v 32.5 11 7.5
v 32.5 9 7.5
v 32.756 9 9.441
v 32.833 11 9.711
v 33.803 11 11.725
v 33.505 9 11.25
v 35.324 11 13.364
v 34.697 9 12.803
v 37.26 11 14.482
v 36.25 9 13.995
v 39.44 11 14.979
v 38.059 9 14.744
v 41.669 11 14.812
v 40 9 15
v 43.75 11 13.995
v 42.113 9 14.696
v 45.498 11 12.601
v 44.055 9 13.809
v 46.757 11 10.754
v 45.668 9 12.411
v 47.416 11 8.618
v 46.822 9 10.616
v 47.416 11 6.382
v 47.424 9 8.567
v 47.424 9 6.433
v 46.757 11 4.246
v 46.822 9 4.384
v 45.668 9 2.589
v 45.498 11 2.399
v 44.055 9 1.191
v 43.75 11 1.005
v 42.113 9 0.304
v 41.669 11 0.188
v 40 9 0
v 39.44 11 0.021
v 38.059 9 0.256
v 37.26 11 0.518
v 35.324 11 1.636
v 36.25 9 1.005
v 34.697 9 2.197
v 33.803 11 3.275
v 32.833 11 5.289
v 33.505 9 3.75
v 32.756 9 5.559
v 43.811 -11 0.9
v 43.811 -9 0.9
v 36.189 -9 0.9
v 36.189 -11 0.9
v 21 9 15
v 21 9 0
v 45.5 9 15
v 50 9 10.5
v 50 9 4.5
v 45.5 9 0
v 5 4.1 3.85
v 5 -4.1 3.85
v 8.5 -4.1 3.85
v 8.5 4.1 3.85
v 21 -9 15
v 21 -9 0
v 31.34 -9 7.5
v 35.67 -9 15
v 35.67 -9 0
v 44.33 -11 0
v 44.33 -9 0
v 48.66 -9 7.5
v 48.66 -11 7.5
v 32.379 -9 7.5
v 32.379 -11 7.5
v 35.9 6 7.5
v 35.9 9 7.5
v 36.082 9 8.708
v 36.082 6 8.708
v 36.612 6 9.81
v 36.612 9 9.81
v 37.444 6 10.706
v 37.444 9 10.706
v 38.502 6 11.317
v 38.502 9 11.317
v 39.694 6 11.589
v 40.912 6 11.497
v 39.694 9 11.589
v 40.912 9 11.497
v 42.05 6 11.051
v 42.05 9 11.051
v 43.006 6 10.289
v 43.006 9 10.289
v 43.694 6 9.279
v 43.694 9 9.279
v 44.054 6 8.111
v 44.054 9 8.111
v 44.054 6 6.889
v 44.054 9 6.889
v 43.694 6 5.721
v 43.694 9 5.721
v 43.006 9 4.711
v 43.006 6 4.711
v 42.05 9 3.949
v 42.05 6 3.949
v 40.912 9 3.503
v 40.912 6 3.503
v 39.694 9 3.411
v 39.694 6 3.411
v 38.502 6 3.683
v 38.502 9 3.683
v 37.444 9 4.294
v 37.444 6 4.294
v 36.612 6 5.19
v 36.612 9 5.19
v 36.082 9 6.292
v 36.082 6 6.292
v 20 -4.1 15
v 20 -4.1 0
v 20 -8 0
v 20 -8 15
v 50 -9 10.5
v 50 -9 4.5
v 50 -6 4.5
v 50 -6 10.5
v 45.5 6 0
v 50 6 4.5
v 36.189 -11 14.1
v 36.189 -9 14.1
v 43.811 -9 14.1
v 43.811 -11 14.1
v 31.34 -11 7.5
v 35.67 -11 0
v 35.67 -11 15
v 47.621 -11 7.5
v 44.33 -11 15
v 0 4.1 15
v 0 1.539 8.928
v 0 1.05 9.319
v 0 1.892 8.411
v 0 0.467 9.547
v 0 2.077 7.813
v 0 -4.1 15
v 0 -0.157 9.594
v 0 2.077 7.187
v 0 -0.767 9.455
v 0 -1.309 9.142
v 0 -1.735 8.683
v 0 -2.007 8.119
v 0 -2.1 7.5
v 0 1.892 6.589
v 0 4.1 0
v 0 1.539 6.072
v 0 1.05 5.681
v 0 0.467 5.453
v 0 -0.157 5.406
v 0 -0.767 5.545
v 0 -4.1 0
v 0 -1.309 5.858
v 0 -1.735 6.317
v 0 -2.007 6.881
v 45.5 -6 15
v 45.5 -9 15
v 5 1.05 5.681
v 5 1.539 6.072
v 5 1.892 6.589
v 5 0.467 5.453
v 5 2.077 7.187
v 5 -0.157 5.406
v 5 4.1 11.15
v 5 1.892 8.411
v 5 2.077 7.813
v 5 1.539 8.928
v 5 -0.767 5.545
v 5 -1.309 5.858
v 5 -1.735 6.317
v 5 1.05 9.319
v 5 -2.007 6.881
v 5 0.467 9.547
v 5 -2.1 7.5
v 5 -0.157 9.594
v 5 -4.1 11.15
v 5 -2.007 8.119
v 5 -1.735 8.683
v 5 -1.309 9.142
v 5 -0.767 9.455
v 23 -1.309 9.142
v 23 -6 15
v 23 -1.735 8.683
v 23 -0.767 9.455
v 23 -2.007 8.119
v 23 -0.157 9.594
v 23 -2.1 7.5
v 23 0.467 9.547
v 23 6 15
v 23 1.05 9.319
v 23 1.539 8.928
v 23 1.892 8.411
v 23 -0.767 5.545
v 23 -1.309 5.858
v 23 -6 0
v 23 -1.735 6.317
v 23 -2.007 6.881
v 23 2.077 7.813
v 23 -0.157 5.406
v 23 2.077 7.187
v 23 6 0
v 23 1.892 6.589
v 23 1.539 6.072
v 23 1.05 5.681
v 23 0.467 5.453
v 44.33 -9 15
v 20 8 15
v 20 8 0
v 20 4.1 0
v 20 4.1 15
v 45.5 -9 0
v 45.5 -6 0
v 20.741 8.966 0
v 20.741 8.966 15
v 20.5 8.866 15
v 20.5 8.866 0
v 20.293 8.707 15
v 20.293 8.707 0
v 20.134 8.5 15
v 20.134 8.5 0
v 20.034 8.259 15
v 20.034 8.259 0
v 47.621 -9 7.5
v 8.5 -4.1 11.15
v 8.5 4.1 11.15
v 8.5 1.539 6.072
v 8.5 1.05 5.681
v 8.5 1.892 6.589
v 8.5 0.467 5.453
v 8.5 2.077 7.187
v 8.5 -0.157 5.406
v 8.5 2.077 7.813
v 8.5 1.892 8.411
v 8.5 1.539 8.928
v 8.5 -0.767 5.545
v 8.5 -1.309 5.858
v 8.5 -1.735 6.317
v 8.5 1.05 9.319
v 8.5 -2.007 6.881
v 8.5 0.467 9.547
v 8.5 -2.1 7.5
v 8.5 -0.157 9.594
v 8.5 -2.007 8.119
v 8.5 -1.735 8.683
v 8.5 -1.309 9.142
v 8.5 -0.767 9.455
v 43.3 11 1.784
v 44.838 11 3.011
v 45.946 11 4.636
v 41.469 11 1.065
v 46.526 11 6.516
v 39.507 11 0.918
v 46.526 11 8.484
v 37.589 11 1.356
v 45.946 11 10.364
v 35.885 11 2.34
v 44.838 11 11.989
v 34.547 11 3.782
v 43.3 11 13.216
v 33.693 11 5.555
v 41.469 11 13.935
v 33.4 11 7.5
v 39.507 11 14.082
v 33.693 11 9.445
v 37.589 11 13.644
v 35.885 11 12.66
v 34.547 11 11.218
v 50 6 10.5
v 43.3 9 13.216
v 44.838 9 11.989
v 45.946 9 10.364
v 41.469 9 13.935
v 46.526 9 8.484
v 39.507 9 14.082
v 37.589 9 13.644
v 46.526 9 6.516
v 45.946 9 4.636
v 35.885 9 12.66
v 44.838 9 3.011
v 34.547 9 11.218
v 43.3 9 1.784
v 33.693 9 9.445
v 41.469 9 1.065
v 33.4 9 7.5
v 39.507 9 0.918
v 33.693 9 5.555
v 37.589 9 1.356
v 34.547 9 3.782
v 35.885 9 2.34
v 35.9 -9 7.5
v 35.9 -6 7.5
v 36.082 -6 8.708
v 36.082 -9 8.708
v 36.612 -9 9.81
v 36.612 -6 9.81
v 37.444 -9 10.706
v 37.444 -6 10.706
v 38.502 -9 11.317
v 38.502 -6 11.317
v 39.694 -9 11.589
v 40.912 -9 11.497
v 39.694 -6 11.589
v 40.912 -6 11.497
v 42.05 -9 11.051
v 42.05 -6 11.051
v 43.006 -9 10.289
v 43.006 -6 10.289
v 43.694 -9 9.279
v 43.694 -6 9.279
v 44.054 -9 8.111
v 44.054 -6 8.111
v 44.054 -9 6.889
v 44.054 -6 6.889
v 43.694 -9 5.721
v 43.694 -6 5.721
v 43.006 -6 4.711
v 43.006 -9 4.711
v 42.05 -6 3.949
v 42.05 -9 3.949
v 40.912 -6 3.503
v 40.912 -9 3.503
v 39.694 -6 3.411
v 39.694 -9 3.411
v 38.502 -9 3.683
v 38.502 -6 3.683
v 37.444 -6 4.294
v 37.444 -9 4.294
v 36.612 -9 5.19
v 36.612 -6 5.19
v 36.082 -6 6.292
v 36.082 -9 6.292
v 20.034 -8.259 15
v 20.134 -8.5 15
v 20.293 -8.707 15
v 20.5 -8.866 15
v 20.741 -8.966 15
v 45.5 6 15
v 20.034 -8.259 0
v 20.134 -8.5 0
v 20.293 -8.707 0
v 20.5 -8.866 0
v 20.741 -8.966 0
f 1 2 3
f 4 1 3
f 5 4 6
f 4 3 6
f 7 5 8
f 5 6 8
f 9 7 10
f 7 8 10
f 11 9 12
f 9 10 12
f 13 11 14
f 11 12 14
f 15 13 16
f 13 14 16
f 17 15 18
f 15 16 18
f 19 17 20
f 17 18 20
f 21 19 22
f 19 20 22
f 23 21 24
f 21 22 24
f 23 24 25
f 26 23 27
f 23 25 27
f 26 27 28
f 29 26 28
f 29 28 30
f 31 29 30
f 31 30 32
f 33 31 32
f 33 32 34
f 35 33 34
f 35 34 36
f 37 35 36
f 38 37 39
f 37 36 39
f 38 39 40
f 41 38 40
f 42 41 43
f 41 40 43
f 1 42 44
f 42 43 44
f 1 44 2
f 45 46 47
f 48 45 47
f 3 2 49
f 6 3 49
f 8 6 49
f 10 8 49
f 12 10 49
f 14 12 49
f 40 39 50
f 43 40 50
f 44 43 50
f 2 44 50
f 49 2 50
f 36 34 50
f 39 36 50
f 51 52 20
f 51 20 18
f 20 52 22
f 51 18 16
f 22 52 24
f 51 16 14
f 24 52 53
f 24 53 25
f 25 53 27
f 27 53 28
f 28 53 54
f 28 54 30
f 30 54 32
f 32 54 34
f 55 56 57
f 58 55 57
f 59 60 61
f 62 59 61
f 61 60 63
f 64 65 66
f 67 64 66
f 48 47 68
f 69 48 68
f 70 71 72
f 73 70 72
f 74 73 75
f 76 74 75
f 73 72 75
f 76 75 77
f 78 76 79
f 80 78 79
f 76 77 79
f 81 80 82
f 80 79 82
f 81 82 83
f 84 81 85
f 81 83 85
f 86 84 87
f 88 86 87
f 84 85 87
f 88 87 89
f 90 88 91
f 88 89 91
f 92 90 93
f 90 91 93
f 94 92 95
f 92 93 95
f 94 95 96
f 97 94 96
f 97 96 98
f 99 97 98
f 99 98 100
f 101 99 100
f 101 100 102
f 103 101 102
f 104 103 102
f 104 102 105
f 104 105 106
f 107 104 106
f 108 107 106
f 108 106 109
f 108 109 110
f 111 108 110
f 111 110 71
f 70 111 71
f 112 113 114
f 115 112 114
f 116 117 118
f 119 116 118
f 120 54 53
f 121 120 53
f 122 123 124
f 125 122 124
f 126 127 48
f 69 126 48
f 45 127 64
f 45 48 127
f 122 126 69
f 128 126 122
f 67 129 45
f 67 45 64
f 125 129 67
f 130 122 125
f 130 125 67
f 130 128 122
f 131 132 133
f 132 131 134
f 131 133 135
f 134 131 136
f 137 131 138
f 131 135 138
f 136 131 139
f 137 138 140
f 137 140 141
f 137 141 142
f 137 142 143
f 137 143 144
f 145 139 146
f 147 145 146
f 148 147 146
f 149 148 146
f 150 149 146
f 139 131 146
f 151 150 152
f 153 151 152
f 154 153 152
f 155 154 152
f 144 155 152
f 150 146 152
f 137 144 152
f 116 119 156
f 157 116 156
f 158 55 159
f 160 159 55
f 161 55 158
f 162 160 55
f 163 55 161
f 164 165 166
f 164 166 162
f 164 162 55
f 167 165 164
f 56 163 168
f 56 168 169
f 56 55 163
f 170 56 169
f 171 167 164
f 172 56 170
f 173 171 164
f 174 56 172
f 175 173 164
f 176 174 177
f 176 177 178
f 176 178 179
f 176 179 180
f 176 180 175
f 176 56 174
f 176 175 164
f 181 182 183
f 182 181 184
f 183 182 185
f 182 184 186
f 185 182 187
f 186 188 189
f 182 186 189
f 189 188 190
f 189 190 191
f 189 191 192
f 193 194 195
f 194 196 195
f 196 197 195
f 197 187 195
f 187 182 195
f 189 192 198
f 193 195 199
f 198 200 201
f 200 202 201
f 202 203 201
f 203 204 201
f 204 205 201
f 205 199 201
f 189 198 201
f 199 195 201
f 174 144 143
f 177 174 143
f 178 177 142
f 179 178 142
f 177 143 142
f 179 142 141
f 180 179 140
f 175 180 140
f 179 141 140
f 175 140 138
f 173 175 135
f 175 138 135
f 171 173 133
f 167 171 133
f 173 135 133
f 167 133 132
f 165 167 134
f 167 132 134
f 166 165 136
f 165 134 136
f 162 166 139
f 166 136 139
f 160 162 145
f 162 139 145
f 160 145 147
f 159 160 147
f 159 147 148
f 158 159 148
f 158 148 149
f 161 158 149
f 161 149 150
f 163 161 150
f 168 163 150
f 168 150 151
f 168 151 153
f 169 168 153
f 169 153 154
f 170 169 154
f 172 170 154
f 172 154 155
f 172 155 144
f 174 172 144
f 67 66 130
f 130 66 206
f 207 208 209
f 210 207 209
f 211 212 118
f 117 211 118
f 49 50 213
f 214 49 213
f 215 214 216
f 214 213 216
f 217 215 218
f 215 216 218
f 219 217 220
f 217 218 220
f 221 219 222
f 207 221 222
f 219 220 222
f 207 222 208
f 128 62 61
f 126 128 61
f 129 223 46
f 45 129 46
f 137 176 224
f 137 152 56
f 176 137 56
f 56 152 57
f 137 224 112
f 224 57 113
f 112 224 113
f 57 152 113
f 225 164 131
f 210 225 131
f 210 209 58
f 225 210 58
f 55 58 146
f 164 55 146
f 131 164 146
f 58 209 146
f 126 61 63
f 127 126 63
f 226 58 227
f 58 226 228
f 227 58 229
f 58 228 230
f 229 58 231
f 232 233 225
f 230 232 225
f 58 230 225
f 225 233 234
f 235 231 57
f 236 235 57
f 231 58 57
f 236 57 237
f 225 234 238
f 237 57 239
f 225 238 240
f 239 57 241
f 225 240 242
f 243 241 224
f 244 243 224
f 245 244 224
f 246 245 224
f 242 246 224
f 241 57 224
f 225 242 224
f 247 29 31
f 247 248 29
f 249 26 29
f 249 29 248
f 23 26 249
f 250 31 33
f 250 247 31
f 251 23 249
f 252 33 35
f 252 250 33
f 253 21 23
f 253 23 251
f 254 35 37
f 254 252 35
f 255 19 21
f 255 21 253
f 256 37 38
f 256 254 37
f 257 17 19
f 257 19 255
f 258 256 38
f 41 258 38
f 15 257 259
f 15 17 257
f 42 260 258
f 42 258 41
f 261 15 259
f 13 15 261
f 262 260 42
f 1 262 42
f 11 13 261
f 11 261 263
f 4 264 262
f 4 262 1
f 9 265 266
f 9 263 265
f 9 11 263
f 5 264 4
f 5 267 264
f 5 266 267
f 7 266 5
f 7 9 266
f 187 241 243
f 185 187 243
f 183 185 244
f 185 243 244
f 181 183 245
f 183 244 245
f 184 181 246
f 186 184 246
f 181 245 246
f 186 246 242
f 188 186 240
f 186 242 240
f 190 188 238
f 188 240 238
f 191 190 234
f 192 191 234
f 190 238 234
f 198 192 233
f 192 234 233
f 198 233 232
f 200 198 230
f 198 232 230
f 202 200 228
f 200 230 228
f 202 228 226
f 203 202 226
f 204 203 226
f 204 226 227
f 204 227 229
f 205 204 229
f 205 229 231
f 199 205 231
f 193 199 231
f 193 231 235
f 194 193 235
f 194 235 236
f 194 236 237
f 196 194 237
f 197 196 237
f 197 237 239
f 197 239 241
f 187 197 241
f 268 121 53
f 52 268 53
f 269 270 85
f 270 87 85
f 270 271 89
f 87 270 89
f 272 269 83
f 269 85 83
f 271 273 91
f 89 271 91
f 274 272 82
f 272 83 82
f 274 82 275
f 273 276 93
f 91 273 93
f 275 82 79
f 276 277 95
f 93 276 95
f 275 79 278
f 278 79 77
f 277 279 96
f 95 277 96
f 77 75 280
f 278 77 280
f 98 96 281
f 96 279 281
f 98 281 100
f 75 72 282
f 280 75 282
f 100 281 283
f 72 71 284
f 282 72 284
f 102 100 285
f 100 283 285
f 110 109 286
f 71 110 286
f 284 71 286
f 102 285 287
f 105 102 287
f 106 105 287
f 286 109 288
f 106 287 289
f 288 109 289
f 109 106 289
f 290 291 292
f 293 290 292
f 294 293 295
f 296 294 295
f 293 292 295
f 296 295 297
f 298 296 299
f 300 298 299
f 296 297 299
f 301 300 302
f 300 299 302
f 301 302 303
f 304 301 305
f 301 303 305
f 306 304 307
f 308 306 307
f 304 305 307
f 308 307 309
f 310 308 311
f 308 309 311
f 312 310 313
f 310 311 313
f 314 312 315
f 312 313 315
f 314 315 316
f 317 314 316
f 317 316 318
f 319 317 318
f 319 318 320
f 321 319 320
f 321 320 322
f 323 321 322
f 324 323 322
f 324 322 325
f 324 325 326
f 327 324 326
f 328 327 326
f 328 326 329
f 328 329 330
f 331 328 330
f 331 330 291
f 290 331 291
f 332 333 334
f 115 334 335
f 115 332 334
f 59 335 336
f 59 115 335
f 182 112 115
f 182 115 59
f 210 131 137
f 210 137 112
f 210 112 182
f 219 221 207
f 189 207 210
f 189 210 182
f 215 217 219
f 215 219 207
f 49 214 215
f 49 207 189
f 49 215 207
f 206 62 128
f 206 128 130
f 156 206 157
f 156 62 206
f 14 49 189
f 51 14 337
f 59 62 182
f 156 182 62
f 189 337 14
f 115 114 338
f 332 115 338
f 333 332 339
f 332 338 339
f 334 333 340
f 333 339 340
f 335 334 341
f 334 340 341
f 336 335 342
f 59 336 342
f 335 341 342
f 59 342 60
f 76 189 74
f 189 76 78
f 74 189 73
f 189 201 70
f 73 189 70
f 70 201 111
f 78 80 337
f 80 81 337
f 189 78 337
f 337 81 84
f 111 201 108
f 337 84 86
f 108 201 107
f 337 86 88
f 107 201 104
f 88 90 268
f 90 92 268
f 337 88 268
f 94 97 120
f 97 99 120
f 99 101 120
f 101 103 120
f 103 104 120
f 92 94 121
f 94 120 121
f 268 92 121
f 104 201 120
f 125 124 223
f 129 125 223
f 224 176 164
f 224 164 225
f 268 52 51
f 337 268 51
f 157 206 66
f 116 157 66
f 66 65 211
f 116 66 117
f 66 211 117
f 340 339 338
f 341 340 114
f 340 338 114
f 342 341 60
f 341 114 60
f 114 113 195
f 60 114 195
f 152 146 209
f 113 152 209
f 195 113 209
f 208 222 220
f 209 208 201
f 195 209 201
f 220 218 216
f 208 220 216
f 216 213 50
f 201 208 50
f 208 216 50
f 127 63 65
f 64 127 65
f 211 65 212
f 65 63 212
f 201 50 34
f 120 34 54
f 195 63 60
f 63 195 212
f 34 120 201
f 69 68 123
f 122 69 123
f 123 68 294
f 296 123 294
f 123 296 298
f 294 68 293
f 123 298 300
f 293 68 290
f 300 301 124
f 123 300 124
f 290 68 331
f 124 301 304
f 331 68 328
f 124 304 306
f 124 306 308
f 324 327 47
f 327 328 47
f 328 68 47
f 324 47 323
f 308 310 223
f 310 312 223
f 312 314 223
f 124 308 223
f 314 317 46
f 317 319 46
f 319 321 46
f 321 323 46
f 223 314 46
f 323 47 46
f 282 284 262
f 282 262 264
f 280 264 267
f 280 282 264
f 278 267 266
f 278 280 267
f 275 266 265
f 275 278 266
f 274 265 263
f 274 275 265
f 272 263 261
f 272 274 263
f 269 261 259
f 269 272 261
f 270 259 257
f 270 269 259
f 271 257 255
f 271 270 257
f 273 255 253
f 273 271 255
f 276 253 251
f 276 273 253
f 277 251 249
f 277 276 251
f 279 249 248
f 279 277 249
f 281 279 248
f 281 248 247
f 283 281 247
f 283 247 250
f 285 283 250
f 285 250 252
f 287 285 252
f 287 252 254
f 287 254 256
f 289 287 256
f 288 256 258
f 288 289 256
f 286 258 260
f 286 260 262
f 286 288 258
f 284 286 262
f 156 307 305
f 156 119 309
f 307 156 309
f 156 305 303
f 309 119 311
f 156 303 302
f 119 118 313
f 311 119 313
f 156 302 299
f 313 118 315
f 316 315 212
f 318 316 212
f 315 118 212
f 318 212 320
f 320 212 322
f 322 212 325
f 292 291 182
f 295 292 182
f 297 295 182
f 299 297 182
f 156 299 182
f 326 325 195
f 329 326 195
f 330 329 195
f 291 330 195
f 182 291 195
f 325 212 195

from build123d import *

# Parameters (mm, degrees)
F1_DEPTH  = 15
F2_R      = 2.1
F3_DEPTH  = 50.001
F4_W      = 3.5
F4_H      = 7.3
F5_DEPTH  = 13.101
F6_R      = 4.1
F7_DEPTH  = 18.001
F9_DEPTH  = 2
F10_R     = 7.5
F10_R_2   = 6.6
F11_DEPTH = 2


with BuildPart() as f1:
    # F0 (on Top) → F1 (new body)
    with BuildSketch(Plane.XY):
        with BuildLine():
            Line((0, 4.1), (0, 0))
            Line((0, 0), (0, -4.1))
            Line((0, -4.1), (20, -4.1))
            Line((20, -4.1), (20, -8))
            ThreePointArc((20, -8), (20.292893, -8.707107), (21, -9))
            Line((21, -9), (50, -9))
            Line((50, -9), (50, -6))
            Line((50, -6), (23, -6))
            Line((23, -6), (23, 0))
            Line((23, 0), (23, 6))
            Line((23, 6), (50, 6))
            Line((50, 6), (50, 9))
            Line((50, 9), (21, 9))
            ThreePointArc((21, 9), (20.292893, 8.707107), (20, 8))
            Line((20, 8), (20, 4.1))
            Line((20, 4.1), (0, 4.1))
        make_face()
    extrude(amount=F1_DEPTH)

    # F2 (on face) → F3 (cut, through all)
    with BuildSketch(Plane(origin=(0, 0, 0), x_dir=(0, -1, 0), z_dir=(-1, 0, 0))):
        with Locations((0, 7.5)):
            Circle(F2_R)
    extrude(amount=-F3_DEPTH, mode=Mode.SUBTRACT)

    # F4 (on face) → F5 (cut, through all)
    with BuildSketch(Plane.XZ.offset(4.1)):
        with Locations((6.75, 7.5)):
            Rectangle(F4_W, F4_H)
    extrude(amount=-F5_DEPTH, mode=Mode.SUBTRACT)

    # F6 (on face) → F7 (cut, through all)
    with BuildSketch(Plane(origin=(0, 9, 0), x_dir=(-1, 0, 0), z_dir=(0, 1, 0))):
        with Locations((-40, 7.5)):
            Circle(F6_R)
        Polygon((-45.5, 15), (-50, 15), (-50, 10.5), align=None)
        Polygon((-50, 4.5), (-50, 0), (-45.5, 0), align=None)
    extrude(amount=-F7_DEPTH, mode=Mode.SUBTRACT)

    # F8 (on face) → F9 (join)
    with BuildSketch(Plane.XZ.offset(9)):
        Polygon((44.330127, 15), (35.669873, 15), (31.339746, 7.5), (35.669873, 0), (44.330127, 0), (48.660254, 7.5), align=None)
        Polygon((32.378976, 7.5), (36.189488, 14.1), (43.810512, 14.1), (47.621024, 7.5), (43.810512, 0.9), (36.189488, 0.9), align=None, mode=Mode.SUBTRACT)
    extrude(amount=F9_DEPTH)

    # F10 (on face) → F11 (join)
    with BuildSketch(Plane(origin=(0, 9, 0), x_dir=(-1, 0, 0), z_dir=(0, 1, 0))):
        with Locations((-40, 7.5)):
            Circle(F10_R)
        with Locations((-40, 7.5)):
            Circle(F10_R_2, mode=Mode.SUBTRACT)
    extrude(amount=F11_DEPTH)


solid = f1.part
